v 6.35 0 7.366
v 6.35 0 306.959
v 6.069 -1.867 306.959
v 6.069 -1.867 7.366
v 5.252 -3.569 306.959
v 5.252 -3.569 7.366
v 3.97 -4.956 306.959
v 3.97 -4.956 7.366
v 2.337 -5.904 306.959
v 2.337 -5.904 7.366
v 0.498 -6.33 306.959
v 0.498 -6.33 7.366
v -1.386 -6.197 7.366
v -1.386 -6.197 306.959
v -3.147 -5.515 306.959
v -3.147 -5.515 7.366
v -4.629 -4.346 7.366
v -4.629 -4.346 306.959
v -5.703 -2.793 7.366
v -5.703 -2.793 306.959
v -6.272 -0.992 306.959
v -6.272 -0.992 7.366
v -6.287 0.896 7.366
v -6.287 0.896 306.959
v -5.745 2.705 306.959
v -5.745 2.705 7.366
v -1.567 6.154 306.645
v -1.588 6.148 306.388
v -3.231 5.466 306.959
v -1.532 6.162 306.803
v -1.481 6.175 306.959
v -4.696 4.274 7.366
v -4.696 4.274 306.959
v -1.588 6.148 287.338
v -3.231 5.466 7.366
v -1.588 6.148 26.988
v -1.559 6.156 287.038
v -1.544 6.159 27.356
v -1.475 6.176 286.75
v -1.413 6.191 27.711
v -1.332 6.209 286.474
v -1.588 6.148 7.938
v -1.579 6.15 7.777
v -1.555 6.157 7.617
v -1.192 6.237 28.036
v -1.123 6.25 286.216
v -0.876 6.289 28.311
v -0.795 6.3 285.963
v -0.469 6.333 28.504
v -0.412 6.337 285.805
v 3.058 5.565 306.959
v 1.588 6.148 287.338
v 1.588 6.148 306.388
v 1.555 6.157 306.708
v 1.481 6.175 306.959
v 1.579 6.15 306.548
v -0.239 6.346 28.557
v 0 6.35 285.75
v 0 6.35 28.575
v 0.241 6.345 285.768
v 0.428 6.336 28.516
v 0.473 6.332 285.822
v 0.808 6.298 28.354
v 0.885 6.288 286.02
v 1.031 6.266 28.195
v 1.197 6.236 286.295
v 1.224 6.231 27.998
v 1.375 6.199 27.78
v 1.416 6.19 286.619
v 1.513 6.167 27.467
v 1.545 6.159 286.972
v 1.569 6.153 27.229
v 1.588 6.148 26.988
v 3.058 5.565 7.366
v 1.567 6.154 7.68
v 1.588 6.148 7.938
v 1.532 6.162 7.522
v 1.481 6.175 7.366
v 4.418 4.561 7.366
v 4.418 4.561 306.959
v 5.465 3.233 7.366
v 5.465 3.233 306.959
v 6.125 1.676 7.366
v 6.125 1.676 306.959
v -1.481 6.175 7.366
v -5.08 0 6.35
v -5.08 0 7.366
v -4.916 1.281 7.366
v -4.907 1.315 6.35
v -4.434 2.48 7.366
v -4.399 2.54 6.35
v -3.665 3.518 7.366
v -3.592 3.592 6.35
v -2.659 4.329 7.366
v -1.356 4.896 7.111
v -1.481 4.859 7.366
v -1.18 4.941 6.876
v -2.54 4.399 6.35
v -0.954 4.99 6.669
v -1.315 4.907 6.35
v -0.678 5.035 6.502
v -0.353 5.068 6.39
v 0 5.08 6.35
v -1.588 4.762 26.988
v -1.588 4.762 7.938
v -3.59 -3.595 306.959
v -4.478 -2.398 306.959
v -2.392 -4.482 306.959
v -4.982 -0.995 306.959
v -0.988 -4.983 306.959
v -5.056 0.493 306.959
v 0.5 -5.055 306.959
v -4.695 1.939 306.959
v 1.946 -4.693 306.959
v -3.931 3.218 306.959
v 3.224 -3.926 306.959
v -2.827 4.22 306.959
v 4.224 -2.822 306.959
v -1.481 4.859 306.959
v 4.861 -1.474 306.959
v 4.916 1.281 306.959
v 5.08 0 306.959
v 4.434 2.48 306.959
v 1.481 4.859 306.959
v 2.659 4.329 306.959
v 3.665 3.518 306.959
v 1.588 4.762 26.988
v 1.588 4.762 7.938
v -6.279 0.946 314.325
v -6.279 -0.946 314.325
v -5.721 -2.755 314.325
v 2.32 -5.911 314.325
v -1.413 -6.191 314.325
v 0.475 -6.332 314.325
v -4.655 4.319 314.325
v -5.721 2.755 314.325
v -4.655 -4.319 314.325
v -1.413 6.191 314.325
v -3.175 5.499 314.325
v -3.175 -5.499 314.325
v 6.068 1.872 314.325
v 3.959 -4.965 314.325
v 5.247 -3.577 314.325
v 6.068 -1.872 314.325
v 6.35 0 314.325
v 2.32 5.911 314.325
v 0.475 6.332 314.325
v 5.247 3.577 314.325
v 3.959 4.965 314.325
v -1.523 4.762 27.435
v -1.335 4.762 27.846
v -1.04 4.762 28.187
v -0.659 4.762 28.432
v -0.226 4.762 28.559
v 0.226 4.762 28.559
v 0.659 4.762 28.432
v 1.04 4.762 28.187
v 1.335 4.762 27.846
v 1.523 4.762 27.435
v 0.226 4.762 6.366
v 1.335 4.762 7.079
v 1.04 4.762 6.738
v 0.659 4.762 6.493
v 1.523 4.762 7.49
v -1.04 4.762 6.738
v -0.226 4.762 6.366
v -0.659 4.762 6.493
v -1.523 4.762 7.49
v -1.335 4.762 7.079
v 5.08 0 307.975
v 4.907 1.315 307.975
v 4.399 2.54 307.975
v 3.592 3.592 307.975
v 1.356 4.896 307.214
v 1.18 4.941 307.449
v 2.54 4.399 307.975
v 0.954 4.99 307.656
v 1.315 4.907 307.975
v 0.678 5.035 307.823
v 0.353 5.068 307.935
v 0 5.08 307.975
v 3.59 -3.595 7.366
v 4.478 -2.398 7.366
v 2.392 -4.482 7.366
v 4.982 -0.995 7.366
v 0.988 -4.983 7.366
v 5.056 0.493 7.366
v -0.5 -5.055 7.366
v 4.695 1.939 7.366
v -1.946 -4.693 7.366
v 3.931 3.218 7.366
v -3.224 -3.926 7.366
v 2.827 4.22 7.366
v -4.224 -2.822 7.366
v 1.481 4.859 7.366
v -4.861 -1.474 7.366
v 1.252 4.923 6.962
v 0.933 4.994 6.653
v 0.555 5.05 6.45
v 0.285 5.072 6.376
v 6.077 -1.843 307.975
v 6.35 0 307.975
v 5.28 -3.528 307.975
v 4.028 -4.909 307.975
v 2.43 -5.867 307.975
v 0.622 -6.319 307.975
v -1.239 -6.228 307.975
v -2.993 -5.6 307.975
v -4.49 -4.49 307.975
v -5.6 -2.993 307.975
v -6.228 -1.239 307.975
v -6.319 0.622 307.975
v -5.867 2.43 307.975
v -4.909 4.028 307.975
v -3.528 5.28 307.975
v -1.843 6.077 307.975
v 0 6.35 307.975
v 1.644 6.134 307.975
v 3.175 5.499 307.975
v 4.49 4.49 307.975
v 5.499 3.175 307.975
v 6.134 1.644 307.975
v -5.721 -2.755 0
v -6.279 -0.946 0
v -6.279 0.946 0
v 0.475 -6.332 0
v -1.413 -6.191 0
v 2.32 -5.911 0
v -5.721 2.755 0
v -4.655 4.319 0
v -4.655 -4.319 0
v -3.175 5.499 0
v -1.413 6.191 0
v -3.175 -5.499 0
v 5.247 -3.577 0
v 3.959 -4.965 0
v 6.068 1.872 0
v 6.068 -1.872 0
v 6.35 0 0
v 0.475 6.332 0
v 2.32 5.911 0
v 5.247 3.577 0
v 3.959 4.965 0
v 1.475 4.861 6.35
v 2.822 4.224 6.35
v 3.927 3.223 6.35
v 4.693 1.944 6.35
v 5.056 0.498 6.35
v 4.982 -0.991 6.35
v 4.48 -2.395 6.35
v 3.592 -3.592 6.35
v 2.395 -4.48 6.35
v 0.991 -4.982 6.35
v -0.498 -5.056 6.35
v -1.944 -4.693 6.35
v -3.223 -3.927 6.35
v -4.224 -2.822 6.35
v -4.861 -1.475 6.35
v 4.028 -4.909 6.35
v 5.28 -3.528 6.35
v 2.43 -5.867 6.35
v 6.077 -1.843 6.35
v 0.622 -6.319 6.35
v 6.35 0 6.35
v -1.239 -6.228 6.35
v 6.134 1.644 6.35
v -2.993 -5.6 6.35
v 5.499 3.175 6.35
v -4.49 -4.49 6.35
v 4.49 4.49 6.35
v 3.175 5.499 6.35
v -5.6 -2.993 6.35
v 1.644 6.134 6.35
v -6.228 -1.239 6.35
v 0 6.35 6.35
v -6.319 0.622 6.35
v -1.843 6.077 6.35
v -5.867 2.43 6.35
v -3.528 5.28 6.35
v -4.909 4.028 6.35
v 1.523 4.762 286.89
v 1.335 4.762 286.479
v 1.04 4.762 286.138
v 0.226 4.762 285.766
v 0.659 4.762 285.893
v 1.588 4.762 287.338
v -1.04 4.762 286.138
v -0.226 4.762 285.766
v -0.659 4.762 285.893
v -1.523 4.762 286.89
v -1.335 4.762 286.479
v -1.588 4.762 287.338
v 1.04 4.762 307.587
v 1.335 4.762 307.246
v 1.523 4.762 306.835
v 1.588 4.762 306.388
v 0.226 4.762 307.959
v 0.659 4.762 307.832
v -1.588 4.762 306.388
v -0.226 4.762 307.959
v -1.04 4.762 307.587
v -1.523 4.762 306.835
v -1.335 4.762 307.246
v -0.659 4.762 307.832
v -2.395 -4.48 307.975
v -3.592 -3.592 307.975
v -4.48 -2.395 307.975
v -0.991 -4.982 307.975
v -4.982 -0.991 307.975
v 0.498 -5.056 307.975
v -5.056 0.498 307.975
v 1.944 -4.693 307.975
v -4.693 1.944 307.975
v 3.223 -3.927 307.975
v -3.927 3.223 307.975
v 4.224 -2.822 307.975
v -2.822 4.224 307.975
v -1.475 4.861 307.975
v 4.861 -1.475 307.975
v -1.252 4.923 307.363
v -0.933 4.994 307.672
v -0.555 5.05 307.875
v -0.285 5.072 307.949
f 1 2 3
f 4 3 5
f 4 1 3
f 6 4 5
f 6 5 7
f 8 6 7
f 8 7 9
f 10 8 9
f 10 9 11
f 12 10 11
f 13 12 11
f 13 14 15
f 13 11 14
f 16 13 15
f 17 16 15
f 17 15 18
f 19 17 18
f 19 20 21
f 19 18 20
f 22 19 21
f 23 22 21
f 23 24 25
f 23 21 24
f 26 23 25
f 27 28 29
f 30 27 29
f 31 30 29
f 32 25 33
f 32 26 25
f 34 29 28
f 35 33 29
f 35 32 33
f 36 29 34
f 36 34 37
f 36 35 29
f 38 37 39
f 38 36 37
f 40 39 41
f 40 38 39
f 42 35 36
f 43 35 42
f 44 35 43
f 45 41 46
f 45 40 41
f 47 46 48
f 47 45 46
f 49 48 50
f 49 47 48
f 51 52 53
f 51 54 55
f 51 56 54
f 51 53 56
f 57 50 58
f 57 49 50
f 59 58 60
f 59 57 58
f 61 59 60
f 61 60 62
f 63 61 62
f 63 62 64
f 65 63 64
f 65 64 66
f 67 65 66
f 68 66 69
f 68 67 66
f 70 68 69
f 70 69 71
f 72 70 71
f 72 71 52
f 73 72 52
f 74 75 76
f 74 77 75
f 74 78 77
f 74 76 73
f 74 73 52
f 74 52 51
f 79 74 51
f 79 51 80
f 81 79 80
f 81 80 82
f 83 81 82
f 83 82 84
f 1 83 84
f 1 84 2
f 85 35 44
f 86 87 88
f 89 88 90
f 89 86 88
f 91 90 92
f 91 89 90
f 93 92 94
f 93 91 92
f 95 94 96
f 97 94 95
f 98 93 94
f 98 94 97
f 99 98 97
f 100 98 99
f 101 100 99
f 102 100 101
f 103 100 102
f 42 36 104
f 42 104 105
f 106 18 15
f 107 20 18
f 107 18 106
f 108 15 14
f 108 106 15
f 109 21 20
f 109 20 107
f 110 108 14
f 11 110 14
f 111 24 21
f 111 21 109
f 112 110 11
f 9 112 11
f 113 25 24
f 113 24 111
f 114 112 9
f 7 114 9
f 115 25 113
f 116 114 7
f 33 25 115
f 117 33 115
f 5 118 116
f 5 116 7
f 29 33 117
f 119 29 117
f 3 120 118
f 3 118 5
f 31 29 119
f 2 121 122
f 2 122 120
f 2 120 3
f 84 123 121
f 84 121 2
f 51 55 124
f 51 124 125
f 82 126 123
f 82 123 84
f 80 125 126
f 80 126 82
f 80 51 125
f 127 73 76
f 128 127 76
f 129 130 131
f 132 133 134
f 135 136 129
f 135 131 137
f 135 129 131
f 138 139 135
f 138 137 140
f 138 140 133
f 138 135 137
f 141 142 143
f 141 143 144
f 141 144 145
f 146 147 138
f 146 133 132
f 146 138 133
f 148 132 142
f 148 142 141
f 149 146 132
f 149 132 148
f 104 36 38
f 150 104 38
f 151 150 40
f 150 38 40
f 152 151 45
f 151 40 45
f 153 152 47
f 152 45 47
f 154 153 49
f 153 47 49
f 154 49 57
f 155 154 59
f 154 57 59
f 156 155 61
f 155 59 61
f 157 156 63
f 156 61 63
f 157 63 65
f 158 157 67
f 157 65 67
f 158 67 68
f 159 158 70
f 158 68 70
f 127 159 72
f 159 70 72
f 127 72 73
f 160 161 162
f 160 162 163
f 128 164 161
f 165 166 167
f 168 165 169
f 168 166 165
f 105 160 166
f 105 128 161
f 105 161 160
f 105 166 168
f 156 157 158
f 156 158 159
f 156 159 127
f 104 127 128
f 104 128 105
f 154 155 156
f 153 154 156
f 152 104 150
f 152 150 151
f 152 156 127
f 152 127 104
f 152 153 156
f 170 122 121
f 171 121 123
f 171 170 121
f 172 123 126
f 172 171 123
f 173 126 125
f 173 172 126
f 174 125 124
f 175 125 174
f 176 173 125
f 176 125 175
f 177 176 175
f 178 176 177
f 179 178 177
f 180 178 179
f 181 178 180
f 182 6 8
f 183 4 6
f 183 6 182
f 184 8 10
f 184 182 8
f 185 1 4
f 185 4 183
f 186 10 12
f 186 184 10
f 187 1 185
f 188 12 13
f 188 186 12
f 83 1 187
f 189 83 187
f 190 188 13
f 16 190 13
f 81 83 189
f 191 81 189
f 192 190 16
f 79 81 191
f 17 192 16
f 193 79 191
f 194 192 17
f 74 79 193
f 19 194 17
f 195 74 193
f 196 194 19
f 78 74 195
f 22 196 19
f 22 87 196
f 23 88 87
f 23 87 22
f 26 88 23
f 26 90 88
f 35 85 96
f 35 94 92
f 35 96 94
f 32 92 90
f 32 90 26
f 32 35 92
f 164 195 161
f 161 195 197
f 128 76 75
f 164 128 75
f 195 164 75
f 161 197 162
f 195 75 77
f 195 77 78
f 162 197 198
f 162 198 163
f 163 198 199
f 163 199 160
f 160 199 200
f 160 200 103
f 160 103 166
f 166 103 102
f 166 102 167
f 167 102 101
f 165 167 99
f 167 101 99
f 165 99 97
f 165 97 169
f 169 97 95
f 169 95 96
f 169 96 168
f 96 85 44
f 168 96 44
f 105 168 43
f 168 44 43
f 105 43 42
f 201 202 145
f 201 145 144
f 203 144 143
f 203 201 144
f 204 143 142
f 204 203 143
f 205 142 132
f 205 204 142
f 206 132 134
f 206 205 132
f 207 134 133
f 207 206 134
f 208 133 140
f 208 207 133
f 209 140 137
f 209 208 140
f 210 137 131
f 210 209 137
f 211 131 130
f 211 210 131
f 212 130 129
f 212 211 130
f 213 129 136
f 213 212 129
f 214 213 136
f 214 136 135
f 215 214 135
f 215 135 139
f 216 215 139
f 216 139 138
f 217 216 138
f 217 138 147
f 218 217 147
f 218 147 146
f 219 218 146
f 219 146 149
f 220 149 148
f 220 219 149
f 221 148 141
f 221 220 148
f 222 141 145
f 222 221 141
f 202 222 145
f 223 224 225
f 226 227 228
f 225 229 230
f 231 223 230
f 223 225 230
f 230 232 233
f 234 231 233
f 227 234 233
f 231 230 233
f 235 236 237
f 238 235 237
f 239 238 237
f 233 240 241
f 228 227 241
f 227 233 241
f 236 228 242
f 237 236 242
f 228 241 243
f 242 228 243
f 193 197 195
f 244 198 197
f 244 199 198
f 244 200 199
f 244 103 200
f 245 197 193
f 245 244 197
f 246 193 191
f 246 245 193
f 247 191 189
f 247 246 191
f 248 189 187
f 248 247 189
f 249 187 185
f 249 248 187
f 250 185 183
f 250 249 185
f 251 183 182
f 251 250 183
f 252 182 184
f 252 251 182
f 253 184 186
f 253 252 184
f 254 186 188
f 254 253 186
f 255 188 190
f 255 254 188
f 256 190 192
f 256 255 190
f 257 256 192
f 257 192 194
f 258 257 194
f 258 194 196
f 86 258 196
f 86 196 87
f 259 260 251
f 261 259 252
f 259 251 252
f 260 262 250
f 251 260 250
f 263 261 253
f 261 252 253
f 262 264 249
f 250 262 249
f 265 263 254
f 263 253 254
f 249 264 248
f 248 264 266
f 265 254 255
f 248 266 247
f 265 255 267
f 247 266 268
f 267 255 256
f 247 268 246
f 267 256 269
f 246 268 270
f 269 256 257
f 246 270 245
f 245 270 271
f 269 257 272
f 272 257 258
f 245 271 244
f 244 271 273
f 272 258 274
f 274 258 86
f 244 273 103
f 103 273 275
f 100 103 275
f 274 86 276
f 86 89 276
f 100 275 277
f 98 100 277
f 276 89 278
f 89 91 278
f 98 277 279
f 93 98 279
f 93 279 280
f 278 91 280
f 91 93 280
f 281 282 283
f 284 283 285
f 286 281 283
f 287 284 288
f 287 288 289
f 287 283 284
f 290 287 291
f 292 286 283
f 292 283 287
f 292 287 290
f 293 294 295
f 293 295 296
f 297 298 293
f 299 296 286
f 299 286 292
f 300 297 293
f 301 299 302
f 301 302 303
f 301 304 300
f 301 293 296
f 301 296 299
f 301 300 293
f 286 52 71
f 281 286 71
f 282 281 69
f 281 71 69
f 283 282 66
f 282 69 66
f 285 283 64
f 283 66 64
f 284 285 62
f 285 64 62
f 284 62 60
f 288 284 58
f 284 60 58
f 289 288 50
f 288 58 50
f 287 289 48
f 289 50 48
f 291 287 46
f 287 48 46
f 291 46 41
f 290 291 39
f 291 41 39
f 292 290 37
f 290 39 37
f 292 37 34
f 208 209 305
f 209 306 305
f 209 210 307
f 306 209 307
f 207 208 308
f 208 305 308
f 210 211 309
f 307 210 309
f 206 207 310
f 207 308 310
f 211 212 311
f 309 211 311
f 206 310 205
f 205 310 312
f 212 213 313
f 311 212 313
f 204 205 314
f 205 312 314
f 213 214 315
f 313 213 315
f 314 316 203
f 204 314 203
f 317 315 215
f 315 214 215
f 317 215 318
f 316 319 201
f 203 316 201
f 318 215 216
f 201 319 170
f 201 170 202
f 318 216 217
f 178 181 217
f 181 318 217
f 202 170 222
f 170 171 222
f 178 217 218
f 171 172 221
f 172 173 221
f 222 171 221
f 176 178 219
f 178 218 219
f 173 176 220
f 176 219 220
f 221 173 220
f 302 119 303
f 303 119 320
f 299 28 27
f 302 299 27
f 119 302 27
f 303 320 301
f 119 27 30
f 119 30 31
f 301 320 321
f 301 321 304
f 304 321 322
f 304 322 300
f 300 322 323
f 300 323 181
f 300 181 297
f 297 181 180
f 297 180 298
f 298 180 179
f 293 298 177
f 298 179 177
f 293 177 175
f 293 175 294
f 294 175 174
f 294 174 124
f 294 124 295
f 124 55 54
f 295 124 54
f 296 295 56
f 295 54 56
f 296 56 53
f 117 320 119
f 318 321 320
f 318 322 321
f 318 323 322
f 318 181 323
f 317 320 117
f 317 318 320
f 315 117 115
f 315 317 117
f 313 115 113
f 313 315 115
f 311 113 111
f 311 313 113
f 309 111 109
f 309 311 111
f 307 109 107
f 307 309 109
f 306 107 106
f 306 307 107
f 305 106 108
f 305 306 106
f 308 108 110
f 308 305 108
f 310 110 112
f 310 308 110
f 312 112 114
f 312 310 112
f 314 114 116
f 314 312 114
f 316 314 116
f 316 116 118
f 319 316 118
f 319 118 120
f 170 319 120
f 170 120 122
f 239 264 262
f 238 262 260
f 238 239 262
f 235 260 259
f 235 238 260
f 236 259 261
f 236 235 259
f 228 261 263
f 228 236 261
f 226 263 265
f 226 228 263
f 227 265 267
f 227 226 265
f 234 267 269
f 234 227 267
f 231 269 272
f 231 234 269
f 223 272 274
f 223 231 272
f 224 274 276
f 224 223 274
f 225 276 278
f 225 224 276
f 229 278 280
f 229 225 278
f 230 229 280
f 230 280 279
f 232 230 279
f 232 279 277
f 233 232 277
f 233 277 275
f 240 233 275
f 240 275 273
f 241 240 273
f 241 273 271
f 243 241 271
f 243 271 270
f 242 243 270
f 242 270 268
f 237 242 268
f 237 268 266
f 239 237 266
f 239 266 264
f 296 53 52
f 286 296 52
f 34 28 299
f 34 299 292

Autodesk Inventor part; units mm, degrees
sketch "Sketch1" plane through (0, 0, 0) normal (0, 0, 1) x (1, 0, 0)
  circle A0 centre (0, 0) radius 6.35
  dimension "d0" = 12.7
extrude "Extrusion1" add sketch "Sketch1" along normal blind 314.325
ref_plane "Work Plane1" through (0, 6.35, 0) normal (0, 1, 0) x (-1, 0, 0)
sketch "Sketch2" plane through (0, 6.35, 0) normal (0, 1, 0) x (-1, 0, 0)
  line L0 (-6.35, 314.325) -> (6.35, 314.325) projected
  line L1 (-6.35, 0) -> (6.35, 0) projected
  line L2 (-6.35, 0) -> (-6.35, 314.325) projected
  line L3 (6.35, 0) -> (6.35, 314.325) projected
  line L4 (-6.35, 6.35) -> (6.35, 6.35)
  line L5 (-6.35, 307.975) -> (6.35, 307.975)
  arc A0 (1.5875, 306.3875) -> (-1.5875, 306.3875) centre (0, 306.3875) ccw
  line L6 (-1.5875, 306.3875) -> (-1.5875, 287.3375)
  line L7 (1.5875, 306.3875) -> (1.5875, 287.3375)
  arc A1 (-1.5875, 287.3375) -> (1.5875, 287.3375) centre (0, 287.3375) ccw
  arc A2 (1.5875, 26.9875) -> (-1.5875, 26.9875) centre (0, 26.9875) ccw
  line L8 (-1.5875, 26.9875) -> (-1.5875, 7.9375)
  line L9 (1.5875, 26.9875) -> (1.5875, 7.9375)
  arc A3 (-1.5875, 7.9375) -> (1.5875, 7.9375) centre (0, 7.9375) ccw
  point P0 (0, 0)
  dimension "d3" = 301.625
  dimension "d4" = 6.35
  dimension "d5" = 6.35
  dimension "d11" = 19.05
  dimension "d12" = 3.175
  dimension "d13" = 19.05
  dimension "d14" = 3.175
  dimension "d15" = 7.9375
  dimension "d16" = 279.4
  dimension "d17" = 6.35
ref_plane "Work Plane2" through (6.35, 6.35, 307.975) normal (0, 0, 1) x (1, 0, 0)
ref_plane "Work Plane3" through (6.35, 6.35, 6.35) normal (0, 0, -1) x (-1, 0, 0)
sketch "Sketch3" plane through (6.35, 6.35, 307.975) normal (0, 0, 1) x (1, 0, 0)
  circle A0 centre (-6.35, -6.35) radius 6.35 projected
  circle A1 centre (-6.35, -6.35) radius 5.08
  dimension "d6" = 10.16
extrude "Extrusion2" cut sketch "Sketch3" against normal blind 1.016
sketch "Sketch4" plane through (6.35, 6.35, 6.35) normal (0, 0, -1) x (-1, 0, 0)
  circle A0 centre (6.35, -6.35) radius 5.08 projected
  circle A1 centre (6.35, -6.35) radius 6.35 projected
extrude "Extrusion3" cut sketch "Sketch4" against normal blind 1.016
extrude "Extrusion4" cut sketch "Sketch2" against normal blind 1.5875 contours A3 L8 A2 L9 | A0 L7 A1 L6
equation "\"d4\" = d5"
properties part number "8 ball roller shaft"
